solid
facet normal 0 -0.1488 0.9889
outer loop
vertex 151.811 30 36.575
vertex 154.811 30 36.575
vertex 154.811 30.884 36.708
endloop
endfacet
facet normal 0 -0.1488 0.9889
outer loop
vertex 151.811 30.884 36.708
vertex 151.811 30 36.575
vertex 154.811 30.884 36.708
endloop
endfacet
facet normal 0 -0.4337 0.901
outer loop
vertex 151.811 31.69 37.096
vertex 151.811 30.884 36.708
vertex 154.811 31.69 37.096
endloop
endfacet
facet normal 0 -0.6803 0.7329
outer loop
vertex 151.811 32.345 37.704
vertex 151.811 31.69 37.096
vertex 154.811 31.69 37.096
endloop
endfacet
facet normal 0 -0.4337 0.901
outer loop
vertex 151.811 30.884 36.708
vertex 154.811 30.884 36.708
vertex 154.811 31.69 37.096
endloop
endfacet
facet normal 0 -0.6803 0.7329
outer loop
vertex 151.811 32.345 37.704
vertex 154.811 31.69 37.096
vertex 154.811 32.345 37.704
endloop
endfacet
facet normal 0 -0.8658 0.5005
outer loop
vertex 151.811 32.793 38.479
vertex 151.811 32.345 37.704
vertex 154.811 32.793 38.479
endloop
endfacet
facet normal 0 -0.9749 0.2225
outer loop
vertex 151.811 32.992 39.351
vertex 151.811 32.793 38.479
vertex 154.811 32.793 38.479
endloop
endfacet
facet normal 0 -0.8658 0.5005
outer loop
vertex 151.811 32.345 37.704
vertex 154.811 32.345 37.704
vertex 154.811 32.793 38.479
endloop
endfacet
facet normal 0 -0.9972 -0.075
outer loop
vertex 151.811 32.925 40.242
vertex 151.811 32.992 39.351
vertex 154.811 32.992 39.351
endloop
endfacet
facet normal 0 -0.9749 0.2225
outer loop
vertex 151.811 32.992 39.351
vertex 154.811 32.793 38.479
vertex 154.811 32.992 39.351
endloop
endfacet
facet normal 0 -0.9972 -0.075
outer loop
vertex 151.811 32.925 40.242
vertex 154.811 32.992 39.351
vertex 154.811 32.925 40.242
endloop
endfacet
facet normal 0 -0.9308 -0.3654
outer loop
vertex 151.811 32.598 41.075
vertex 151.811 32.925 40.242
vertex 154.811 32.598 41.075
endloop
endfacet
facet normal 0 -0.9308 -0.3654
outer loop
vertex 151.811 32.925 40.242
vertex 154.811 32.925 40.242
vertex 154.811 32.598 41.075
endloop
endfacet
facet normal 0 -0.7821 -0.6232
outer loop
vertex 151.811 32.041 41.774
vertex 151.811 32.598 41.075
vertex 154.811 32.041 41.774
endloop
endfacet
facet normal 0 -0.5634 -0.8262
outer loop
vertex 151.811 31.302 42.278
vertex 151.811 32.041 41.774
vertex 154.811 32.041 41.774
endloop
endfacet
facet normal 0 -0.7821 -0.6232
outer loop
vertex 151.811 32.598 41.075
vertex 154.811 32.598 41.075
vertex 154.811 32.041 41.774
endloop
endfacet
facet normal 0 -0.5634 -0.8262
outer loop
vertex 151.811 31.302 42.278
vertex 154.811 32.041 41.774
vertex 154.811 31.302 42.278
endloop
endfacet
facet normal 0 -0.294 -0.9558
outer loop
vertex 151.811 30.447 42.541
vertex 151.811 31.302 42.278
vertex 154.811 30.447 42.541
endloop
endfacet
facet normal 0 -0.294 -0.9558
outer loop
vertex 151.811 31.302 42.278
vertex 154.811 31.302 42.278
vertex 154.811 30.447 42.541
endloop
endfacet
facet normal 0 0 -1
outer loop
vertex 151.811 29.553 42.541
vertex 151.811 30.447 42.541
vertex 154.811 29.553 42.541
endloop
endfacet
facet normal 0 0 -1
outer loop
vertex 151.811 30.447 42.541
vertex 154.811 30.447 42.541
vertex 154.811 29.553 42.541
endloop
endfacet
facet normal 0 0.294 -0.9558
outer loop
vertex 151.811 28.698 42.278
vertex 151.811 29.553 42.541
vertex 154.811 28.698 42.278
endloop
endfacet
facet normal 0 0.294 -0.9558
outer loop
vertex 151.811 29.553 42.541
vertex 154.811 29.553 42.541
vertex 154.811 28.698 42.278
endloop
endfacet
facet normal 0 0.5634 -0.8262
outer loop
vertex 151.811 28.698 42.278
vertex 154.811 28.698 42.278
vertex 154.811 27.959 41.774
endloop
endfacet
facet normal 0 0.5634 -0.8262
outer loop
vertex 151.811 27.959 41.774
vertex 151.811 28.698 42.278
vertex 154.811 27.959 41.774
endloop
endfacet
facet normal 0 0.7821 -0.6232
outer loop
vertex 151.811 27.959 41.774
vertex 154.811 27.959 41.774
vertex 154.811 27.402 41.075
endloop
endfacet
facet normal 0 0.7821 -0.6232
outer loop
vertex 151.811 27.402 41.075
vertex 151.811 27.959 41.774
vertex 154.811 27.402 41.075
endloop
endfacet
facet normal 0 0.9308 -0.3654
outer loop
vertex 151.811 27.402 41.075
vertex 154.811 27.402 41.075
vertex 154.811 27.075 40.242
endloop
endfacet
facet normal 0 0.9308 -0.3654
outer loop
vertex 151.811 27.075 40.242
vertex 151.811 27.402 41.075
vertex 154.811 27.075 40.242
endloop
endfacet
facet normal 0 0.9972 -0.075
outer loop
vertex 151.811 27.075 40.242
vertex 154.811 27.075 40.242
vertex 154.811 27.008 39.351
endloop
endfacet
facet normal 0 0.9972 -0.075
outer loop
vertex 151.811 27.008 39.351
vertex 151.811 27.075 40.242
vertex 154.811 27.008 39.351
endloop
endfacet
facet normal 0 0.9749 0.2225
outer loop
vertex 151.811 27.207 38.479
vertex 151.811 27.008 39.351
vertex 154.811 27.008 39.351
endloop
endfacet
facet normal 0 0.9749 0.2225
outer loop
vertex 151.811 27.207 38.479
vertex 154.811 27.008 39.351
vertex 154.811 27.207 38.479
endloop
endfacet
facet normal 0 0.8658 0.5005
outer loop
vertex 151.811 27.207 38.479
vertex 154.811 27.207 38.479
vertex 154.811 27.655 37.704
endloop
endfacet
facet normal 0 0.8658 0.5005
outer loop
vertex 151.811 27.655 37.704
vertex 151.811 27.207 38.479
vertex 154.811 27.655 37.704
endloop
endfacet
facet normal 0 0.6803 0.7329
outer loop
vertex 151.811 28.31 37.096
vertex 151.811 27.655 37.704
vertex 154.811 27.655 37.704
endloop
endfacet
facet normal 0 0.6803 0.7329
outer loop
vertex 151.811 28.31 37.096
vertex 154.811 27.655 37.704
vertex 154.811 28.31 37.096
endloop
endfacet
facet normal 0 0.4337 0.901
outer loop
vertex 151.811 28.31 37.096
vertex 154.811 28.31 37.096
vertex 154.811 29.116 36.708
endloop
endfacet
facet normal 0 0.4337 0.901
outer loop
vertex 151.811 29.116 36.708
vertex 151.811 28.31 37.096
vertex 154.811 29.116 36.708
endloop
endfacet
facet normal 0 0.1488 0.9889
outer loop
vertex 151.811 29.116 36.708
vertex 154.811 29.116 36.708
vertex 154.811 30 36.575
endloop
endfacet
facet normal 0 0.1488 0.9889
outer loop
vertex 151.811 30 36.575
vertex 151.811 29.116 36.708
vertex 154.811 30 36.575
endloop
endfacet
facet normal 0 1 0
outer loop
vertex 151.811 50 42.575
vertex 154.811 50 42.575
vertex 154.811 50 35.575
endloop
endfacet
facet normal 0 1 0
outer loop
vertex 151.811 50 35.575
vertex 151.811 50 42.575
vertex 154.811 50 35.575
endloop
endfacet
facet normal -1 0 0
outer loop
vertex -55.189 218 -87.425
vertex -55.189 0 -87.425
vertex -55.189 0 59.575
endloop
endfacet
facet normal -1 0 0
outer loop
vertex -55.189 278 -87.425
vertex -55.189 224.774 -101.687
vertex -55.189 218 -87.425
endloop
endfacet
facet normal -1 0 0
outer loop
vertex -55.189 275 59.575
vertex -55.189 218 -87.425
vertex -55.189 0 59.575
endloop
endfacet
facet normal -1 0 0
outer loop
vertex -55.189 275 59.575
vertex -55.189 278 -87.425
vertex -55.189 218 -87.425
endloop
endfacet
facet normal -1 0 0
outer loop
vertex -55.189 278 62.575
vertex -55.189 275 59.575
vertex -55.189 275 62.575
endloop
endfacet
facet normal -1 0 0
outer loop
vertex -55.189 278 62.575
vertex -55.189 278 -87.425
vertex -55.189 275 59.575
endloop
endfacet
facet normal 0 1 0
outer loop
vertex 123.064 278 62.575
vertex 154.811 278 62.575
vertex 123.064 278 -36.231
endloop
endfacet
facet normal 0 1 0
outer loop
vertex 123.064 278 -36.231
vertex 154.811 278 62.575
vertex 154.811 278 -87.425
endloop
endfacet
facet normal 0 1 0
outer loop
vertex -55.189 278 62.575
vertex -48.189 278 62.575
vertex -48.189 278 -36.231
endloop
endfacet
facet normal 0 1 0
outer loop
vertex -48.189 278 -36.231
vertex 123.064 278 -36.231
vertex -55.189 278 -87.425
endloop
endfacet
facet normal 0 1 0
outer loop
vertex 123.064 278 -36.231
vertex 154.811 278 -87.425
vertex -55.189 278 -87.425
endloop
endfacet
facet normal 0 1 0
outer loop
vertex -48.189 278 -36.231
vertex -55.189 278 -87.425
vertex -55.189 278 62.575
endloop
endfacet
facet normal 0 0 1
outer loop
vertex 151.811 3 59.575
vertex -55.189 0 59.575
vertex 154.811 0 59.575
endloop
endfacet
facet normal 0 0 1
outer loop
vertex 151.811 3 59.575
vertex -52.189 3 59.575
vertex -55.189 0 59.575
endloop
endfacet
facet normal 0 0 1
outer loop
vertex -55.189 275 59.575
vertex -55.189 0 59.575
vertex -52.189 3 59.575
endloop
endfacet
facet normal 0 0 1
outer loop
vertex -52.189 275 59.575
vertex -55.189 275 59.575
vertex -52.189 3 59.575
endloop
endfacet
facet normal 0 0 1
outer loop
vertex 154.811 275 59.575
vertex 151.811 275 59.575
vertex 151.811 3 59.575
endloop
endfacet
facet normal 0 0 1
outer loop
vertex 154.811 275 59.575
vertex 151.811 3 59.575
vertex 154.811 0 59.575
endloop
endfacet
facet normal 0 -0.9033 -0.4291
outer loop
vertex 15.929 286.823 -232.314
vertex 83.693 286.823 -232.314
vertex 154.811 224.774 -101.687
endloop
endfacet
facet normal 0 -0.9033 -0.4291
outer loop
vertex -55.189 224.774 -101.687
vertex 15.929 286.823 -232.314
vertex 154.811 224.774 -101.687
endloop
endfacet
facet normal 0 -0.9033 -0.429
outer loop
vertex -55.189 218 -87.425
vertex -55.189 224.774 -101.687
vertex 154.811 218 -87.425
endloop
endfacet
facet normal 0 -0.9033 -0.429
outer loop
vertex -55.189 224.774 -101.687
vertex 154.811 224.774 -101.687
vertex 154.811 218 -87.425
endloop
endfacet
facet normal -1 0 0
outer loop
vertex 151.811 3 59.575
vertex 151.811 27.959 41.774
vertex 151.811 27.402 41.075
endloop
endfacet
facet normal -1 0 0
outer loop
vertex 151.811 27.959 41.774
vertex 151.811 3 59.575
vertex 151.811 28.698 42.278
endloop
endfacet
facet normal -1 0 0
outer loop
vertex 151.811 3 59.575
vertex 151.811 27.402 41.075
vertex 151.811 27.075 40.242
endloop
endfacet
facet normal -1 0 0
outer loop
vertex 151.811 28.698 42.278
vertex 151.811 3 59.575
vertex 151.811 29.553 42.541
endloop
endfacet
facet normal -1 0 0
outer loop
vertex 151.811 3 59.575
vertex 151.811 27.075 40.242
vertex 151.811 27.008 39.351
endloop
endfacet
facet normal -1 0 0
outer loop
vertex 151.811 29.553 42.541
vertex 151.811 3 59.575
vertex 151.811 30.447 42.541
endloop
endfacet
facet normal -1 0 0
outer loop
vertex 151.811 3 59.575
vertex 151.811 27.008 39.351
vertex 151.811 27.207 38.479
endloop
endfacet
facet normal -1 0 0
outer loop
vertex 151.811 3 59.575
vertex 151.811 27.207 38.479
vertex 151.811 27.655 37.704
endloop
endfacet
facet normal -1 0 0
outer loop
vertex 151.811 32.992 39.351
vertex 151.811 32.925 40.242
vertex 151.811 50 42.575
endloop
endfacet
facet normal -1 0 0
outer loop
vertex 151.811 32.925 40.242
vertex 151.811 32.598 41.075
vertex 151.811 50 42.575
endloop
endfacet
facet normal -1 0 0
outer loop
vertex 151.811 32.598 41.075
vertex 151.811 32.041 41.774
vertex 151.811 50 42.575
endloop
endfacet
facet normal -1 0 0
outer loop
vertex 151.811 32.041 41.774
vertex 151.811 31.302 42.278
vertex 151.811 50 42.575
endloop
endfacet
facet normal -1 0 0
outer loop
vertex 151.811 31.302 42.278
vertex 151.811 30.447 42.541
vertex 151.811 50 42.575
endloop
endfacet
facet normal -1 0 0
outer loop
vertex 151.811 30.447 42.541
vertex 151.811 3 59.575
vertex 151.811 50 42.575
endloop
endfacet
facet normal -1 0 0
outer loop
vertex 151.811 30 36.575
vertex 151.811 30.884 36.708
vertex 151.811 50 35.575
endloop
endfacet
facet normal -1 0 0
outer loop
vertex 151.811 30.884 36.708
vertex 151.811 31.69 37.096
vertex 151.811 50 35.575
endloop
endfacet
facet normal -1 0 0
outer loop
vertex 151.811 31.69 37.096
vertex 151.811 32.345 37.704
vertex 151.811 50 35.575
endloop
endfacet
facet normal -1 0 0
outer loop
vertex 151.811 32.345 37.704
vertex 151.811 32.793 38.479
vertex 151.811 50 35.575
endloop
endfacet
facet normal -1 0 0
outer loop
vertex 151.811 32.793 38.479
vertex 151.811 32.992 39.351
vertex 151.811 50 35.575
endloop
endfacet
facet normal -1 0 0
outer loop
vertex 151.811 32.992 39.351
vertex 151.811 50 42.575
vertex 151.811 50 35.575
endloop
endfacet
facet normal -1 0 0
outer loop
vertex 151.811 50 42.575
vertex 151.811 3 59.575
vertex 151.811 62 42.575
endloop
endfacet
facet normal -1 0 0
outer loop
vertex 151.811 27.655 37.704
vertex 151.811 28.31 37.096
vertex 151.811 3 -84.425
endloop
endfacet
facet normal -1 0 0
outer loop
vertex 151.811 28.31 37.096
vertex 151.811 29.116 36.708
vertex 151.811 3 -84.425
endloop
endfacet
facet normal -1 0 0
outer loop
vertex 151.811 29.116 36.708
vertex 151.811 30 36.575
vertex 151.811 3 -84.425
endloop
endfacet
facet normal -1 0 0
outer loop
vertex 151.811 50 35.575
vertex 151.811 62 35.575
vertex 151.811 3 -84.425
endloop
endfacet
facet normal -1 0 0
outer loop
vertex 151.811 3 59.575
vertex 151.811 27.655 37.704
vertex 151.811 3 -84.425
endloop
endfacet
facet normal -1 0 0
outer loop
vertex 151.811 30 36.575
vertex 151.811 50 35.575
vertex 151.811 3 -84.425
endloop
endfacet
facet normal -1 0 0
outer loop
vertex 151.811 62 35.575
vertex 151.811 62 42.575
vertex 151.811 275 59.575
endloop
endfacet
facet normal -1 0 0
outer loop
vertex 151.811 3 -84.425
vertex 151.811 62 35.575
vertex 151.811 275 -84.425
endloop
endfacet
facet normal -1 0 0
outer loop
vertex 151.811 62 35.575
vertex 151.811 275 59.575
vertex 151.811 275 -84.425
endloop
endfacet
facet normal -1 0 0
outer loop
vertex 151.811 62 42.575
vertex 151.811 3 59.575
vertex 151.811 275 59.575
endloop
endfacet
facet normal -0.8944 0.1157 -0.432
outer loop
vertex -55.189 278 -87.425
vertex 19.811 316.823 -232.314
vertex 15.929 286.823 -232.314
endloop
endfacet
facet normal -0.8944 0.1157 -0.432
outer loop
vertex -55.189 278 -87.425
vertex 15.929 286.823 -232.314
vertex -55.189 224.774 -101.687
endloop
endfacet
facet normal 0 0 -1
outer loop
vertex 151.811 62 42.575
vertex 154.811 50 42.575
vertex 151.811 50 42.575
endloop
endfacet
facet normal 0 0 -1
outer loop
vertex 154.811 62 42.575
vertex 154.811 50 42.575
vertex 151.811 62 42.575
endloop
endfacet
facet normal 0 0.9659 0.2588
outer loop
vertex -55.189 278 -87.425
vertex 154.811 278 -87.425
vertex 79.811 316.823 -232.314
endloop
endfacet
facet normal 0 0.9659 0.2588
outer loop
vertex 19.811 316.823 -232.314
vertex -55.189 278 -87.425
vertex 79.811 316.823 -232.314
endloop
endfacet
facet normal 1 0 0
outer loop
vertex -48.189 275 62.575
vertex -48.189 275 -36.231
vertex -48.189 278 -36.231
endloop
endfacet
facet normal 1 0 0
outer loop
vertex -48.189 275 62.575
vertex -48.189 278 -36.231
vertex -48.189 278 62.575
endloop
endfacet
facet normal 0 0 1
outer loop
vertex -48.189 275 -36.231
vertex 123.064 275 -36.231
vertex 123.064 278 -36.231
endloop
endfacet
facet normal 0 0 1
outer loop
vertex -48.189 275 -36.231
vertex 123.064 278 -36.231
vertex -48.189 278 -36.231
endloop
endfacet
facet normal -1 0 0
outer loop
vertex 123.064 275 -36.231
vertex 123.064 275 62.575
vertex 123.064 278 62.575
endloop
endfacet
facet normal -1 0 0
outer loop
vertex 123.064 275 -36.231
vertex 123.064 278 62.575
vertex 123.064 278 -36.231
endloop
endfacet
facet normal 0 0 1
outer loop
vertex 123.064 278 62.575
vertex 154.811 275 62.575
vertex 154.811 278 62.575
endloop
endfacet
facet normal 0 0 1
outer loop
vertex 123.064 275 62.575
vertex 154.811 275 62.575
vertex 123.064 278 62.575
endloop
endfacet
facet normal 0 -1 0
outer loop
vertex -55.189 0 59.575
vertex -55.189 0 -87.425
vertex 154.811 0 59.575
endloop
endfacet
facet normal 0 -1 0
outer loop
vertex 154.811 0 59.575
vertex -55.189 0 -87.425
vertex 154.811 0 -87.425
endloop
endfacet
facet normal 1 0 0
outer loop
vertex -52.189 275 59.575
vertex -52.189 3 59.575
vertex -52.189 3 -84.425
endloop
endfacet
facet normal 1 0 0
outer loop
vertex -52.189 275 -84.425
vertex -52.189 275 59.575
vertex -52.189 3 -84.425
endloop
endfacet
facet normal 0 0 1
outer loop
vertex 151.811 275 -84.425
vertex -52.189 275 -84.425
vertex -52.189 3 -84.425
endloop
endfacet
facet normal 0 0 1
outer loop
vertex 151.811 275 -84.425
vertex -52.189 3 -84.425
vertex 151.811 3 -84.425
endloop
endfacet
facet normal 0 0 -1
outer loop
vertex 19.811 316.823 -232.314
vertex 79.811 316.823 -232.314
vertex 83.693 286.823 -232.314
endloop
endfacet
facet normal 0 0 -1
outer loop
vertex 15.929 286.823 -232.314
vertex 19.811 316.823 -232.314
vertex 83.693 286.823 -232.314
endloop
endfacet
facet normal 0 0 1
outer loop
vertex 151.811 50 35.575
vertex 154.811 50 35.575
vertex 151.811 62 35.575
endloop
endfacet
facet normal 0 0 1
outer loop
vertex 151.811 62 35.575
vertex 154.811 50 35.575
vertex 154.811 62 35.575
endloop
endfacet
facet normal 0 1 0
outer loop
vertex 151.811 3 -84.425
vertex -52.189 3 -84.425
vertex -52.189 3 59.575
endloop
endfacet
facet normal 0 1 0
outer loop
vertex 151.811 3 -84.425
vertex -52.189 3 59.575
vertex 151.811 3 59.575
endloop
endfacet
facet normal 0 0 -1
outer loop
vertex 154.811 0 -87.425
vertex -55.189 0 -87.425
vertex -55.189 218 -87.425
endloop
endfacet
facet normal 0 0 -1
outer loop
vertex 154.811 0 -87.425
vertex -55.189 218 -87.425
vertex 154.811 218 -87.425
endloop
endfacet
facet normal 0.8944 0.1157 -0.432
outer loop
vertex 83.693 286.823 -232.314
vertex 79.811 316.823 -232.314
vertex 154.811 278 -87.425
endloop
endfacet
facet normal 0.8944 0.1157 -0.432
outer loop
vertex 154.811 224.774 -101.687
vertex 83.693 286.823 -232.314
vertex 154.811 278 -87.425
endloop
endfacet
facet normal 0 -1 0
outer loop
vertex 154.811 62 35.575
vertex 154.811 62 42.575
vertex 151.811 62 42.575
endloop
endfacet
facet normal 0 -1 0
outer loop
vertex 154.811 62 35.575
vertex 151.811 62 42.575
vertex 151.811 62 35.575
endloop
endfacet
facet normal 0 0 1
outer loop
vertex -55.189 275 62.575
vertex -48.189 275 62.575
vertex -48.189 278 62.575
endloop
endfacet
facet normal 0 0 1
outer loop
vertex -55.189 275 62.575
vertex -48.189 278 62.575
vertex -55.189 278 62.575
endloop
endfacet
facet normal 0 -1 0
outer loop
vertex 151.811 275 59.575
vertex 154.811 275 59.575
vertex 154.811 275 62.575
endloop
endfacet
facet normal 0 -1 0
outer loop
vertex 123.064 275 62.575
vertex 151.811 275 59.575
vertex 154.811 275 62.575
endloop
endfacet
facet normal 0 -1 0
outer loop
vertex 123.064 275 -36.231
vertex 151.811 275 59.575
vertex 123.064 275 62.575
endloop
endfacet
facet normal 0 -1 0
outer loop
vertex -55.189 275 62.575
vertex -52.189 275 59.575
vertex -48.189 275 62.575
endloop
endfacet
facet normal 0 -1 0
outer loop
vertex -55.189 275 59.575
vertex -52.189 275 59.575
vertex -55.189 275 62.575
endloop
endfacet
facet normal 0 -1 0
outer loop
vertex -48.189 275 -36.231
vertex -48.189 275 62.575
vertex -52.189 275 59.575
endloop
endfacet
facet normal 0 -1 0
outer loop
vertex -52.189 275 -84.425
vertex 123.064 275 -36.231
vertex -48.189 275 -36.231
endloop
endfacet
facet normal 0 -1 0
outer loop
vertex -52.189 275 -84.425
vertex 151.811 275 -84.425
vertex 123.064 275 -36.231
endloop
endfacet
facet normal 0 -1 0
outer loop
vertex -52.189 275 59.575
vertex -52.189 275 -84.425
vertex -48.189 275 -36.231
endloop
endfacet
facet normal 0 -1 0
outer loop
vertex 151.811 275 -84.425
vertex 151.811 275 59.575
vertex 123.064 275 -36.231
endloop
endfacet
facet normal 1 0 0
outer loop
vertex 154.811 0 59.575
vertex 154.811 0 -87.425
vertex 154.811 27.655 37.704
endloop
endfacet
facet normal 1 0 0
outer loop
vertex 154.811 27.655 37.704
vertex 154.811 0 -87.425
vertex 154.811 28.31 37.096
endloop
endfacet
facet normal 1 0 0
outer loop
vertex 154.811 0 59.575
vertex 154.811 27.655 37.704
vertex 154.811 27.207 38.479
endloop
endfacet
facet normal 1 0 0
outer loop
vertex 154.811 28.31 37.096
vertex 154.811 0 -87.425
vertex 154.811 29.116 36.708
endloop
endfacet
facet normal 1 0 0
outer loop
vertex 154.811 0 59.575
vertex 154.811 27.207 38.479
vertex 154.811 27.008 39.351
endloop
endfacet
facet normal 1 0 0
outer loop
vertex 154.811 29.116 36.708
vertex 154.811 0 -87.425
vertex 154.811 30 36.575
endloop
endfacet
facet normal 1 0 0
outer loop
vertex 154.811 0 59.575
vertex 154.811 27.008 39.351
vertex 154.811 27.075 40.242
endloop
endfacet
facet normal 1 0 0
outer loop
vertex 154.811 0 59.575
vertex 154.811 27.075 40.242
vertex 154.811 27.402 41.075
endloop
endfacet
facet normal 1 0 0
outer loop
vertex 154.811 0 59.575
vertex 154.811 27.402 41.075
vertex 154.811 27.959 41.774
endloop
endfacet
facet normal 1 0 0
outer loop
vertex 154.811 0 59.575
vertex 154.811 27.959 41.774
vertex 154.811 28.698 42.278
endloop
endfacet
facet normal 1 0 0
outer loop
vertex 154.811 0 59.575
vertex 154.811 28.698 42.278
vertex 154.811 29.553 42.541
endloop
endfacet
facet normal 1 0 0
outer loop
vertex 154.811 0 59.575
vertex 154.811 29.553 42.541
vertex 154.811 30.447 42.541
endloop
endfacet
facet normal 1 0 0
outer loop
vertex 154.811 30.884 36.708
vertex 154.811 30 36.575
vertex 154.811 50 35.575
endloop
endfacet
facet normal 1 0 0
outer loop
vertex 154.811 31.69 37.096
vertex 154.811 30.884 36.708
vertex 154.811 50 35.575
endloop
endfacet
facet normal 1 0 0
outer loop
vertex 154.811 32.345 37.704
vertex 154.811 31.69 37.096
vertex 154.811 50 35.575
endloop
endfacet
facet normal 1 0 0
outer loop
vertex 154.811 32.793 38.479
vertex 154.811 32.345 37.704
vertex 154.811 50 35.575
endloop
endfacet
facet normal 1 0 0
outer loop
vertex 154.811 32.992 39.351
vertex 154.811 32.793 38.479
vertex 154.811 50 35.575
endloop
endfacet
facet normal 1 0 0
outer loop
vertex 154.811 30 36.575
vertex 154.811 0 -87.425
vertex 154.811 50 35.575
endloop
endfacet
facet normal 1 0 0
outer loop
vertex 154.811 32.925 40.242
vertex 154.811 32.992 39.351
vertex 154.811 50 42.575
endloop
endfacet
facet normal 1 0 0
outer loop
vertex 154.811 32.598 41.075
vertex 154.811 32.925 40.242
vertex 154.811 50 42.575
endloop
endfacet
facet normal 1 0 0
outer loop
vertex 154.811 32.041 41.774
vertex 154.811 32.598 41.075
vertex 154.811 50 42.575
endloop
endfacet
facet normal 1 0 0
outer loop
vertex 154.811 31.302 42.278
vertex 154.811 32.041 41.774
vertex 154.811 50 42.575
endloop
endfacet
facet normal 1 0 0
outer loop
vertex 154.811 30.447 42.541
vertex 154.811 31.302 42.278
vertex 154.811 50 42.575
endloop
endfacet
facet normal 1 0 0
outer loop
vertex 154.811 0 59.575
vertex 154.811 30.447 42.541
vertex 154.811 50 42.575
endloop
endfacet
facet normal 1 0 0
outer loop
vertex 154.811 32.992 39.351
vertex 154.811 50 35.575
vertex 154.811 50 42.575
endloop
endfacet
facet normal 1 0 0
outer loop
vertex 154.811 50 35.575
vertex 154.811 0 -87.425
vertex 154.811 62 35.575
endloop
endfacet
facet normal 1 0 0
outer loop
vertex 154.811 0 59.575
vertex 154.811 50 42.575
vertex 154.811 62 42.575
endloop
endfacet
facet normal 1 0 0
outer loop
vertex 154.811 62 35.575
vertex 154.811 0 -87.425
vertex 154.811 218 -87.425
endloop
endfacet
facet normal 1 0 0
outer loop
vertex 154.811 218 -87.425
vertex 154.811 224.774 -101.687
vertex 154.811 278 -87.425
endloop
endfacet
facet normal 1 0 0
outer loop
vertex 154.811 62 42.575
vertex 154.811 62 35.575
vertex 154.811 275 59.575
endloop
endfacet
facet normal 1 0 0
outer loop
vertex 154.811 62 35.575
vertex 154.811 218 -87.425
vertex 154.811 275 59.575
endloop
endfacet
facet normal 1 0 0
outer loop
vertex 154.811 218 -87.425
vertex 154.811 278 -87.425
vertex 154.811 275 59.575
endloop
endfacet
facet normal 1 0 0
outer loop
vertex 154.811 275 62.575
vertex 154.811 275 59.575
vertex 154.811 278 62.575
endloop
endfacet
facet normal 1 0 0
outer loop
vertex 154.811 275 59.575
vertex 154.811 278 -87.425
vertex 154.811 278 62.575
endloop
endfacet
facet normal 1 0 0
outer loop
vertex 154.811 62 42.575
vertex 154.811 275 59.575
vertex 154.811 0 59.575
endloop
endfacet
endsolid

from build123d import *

# Parameters (mm, degrees)
SKETCH2_W           = 210
SKETCH2_H           = 150
BOSS_EXTRUDE3_DEPTH = 275
SKETCH5_W           = 204
SKETCH5_H           = 144
CUT_EXTRUDE1_DEPTH  = 272
SKETCH6_W           = 210
SKETCH6_H           = 275
CUT_EXTRUDE2_DEPTH  = 3
BOSS_EXTRUDE4_DEPTH = 3
BOSS_EXTRUDE6_DEPTH = 210
CUT_EXTRUDE3_DEPTH  = 210
SKETCH12_R          = 3
SKETCH12_W          = 7
SKETCH12_H          = 12
CUT_EXTRUDE4_DEPTH  = 26


with BuildPart() as part:
    # Sketch2 → Boss-Extrude3 (new body)
    with BuildSketch(Plane(origin=(0, 0, 0), x_dir=(1, 0, 0), z_dir=(0, 1, 0))):
        with Locations((49.81119073, 12.425134533)):
            Rectangle(SKETCH2_W, SKETCH2_H)
    extrude(amount=BOSS_EXTRUDE3_DEPTH)

    # Sketch5 → Cut-Extrude1 (cut)
    with BuildSketch(Plane(origin=(0, 275, 0), x_dir=(1, 0, 0), z_dir=(0, 1, 0))):
        with Locations((49.81119073, 12.425134533)):
            Rectangle(SKETCH5_W, SKETCH5_H)
    extrude(amount=-CUT_EXTRUDE1_DEPTH, mode=Mode.SUBTRACT)

    # Sketch6 → Cut-Extrude2 (cut)
    with BuildSketch(Plane.XY.offset(62.574865467)):
        with Locations((49.81119073, 137.5)):
            Rectangle(SKETCH6_W, SKETCH6_H)
    extrude(amount=-CUT_EXTRUDE2_DEPTH, mode=Mode.SUBTRACT)

    # Sketch8 → Boss-Extrude4 (add)
    with BuildSketch(Plane(origin=(0, 275, 0), x_dir=(1, 0, 0), z_dir=(0, 1, 0))):
        Polygon((154.81119073, -62.574865467), (123.063521966, -62.574865467), (123.063521966, 36.23081547), (-48.18880927, 36.23081547), (-48.18880927, -62.574865467), (-55.18880927, -62.574865467), (-55.18880927, 87.425134533), (154.81119073, 87.425134533), align=None)
    extrude(amount=BOSS_EXTRUDE4_DEPTH)

    # Sketch10 → Boss-Extrude6 (add)
    with BuildSketch(Plane(origin=(154.81119073, 0, 0), x_dir=(0, 0, -1), z_dir=(1, 0, 0))):
        Polygon((87.425134533, 278), (232.314008477, 316.822856765), (232.314008477, 286.822856765), (87.425134533, 218), align=None)
    extrude(amount=-BOSS_EXTRUDE6_DEPTH)

    # Sketch11 → Cut-Extrude3 (cut)
    with BuildSketch(Plane(origin=(0, 237.521247493, 63.643626451), x_dir=(-1, 0, 0), z_dir=(0, 0.9659258262890681, 0.25881904510252135))):
        Polygon((-19.81119073, -306.397889851), (55.18880927, -156.397889851), (55.18880927, -306.397889851), align=None)
        Polygon((-79.81119073, -306.397889851), (-154.81119073, -156.397889851), (-154.81119073, -306.397889851), align=None)
    extrude(amount=-CUT_EXTRUDE3_DEPTH, mode=Mode.SUBTRACT)

    # Sketch12 → Cut-Extrude4 (cut)
    with BuildSketch(Plane(origin=(154.81119073, 0, 0), x_dir=(0, 0, -1), z_dir=(1, 0, 0))):
        with Locations((-39.574865467, 30)):
            Circle(SKETCH12_R)
        with Locations((-39.074865467, 56)):
            Rectangle(SKETCH12_W, SKETCH12_H)
    extrude(amount=-CUT_EXTRUDE4_DEPTH, mode=Mode.SUBTRACT)


solid = part.part
